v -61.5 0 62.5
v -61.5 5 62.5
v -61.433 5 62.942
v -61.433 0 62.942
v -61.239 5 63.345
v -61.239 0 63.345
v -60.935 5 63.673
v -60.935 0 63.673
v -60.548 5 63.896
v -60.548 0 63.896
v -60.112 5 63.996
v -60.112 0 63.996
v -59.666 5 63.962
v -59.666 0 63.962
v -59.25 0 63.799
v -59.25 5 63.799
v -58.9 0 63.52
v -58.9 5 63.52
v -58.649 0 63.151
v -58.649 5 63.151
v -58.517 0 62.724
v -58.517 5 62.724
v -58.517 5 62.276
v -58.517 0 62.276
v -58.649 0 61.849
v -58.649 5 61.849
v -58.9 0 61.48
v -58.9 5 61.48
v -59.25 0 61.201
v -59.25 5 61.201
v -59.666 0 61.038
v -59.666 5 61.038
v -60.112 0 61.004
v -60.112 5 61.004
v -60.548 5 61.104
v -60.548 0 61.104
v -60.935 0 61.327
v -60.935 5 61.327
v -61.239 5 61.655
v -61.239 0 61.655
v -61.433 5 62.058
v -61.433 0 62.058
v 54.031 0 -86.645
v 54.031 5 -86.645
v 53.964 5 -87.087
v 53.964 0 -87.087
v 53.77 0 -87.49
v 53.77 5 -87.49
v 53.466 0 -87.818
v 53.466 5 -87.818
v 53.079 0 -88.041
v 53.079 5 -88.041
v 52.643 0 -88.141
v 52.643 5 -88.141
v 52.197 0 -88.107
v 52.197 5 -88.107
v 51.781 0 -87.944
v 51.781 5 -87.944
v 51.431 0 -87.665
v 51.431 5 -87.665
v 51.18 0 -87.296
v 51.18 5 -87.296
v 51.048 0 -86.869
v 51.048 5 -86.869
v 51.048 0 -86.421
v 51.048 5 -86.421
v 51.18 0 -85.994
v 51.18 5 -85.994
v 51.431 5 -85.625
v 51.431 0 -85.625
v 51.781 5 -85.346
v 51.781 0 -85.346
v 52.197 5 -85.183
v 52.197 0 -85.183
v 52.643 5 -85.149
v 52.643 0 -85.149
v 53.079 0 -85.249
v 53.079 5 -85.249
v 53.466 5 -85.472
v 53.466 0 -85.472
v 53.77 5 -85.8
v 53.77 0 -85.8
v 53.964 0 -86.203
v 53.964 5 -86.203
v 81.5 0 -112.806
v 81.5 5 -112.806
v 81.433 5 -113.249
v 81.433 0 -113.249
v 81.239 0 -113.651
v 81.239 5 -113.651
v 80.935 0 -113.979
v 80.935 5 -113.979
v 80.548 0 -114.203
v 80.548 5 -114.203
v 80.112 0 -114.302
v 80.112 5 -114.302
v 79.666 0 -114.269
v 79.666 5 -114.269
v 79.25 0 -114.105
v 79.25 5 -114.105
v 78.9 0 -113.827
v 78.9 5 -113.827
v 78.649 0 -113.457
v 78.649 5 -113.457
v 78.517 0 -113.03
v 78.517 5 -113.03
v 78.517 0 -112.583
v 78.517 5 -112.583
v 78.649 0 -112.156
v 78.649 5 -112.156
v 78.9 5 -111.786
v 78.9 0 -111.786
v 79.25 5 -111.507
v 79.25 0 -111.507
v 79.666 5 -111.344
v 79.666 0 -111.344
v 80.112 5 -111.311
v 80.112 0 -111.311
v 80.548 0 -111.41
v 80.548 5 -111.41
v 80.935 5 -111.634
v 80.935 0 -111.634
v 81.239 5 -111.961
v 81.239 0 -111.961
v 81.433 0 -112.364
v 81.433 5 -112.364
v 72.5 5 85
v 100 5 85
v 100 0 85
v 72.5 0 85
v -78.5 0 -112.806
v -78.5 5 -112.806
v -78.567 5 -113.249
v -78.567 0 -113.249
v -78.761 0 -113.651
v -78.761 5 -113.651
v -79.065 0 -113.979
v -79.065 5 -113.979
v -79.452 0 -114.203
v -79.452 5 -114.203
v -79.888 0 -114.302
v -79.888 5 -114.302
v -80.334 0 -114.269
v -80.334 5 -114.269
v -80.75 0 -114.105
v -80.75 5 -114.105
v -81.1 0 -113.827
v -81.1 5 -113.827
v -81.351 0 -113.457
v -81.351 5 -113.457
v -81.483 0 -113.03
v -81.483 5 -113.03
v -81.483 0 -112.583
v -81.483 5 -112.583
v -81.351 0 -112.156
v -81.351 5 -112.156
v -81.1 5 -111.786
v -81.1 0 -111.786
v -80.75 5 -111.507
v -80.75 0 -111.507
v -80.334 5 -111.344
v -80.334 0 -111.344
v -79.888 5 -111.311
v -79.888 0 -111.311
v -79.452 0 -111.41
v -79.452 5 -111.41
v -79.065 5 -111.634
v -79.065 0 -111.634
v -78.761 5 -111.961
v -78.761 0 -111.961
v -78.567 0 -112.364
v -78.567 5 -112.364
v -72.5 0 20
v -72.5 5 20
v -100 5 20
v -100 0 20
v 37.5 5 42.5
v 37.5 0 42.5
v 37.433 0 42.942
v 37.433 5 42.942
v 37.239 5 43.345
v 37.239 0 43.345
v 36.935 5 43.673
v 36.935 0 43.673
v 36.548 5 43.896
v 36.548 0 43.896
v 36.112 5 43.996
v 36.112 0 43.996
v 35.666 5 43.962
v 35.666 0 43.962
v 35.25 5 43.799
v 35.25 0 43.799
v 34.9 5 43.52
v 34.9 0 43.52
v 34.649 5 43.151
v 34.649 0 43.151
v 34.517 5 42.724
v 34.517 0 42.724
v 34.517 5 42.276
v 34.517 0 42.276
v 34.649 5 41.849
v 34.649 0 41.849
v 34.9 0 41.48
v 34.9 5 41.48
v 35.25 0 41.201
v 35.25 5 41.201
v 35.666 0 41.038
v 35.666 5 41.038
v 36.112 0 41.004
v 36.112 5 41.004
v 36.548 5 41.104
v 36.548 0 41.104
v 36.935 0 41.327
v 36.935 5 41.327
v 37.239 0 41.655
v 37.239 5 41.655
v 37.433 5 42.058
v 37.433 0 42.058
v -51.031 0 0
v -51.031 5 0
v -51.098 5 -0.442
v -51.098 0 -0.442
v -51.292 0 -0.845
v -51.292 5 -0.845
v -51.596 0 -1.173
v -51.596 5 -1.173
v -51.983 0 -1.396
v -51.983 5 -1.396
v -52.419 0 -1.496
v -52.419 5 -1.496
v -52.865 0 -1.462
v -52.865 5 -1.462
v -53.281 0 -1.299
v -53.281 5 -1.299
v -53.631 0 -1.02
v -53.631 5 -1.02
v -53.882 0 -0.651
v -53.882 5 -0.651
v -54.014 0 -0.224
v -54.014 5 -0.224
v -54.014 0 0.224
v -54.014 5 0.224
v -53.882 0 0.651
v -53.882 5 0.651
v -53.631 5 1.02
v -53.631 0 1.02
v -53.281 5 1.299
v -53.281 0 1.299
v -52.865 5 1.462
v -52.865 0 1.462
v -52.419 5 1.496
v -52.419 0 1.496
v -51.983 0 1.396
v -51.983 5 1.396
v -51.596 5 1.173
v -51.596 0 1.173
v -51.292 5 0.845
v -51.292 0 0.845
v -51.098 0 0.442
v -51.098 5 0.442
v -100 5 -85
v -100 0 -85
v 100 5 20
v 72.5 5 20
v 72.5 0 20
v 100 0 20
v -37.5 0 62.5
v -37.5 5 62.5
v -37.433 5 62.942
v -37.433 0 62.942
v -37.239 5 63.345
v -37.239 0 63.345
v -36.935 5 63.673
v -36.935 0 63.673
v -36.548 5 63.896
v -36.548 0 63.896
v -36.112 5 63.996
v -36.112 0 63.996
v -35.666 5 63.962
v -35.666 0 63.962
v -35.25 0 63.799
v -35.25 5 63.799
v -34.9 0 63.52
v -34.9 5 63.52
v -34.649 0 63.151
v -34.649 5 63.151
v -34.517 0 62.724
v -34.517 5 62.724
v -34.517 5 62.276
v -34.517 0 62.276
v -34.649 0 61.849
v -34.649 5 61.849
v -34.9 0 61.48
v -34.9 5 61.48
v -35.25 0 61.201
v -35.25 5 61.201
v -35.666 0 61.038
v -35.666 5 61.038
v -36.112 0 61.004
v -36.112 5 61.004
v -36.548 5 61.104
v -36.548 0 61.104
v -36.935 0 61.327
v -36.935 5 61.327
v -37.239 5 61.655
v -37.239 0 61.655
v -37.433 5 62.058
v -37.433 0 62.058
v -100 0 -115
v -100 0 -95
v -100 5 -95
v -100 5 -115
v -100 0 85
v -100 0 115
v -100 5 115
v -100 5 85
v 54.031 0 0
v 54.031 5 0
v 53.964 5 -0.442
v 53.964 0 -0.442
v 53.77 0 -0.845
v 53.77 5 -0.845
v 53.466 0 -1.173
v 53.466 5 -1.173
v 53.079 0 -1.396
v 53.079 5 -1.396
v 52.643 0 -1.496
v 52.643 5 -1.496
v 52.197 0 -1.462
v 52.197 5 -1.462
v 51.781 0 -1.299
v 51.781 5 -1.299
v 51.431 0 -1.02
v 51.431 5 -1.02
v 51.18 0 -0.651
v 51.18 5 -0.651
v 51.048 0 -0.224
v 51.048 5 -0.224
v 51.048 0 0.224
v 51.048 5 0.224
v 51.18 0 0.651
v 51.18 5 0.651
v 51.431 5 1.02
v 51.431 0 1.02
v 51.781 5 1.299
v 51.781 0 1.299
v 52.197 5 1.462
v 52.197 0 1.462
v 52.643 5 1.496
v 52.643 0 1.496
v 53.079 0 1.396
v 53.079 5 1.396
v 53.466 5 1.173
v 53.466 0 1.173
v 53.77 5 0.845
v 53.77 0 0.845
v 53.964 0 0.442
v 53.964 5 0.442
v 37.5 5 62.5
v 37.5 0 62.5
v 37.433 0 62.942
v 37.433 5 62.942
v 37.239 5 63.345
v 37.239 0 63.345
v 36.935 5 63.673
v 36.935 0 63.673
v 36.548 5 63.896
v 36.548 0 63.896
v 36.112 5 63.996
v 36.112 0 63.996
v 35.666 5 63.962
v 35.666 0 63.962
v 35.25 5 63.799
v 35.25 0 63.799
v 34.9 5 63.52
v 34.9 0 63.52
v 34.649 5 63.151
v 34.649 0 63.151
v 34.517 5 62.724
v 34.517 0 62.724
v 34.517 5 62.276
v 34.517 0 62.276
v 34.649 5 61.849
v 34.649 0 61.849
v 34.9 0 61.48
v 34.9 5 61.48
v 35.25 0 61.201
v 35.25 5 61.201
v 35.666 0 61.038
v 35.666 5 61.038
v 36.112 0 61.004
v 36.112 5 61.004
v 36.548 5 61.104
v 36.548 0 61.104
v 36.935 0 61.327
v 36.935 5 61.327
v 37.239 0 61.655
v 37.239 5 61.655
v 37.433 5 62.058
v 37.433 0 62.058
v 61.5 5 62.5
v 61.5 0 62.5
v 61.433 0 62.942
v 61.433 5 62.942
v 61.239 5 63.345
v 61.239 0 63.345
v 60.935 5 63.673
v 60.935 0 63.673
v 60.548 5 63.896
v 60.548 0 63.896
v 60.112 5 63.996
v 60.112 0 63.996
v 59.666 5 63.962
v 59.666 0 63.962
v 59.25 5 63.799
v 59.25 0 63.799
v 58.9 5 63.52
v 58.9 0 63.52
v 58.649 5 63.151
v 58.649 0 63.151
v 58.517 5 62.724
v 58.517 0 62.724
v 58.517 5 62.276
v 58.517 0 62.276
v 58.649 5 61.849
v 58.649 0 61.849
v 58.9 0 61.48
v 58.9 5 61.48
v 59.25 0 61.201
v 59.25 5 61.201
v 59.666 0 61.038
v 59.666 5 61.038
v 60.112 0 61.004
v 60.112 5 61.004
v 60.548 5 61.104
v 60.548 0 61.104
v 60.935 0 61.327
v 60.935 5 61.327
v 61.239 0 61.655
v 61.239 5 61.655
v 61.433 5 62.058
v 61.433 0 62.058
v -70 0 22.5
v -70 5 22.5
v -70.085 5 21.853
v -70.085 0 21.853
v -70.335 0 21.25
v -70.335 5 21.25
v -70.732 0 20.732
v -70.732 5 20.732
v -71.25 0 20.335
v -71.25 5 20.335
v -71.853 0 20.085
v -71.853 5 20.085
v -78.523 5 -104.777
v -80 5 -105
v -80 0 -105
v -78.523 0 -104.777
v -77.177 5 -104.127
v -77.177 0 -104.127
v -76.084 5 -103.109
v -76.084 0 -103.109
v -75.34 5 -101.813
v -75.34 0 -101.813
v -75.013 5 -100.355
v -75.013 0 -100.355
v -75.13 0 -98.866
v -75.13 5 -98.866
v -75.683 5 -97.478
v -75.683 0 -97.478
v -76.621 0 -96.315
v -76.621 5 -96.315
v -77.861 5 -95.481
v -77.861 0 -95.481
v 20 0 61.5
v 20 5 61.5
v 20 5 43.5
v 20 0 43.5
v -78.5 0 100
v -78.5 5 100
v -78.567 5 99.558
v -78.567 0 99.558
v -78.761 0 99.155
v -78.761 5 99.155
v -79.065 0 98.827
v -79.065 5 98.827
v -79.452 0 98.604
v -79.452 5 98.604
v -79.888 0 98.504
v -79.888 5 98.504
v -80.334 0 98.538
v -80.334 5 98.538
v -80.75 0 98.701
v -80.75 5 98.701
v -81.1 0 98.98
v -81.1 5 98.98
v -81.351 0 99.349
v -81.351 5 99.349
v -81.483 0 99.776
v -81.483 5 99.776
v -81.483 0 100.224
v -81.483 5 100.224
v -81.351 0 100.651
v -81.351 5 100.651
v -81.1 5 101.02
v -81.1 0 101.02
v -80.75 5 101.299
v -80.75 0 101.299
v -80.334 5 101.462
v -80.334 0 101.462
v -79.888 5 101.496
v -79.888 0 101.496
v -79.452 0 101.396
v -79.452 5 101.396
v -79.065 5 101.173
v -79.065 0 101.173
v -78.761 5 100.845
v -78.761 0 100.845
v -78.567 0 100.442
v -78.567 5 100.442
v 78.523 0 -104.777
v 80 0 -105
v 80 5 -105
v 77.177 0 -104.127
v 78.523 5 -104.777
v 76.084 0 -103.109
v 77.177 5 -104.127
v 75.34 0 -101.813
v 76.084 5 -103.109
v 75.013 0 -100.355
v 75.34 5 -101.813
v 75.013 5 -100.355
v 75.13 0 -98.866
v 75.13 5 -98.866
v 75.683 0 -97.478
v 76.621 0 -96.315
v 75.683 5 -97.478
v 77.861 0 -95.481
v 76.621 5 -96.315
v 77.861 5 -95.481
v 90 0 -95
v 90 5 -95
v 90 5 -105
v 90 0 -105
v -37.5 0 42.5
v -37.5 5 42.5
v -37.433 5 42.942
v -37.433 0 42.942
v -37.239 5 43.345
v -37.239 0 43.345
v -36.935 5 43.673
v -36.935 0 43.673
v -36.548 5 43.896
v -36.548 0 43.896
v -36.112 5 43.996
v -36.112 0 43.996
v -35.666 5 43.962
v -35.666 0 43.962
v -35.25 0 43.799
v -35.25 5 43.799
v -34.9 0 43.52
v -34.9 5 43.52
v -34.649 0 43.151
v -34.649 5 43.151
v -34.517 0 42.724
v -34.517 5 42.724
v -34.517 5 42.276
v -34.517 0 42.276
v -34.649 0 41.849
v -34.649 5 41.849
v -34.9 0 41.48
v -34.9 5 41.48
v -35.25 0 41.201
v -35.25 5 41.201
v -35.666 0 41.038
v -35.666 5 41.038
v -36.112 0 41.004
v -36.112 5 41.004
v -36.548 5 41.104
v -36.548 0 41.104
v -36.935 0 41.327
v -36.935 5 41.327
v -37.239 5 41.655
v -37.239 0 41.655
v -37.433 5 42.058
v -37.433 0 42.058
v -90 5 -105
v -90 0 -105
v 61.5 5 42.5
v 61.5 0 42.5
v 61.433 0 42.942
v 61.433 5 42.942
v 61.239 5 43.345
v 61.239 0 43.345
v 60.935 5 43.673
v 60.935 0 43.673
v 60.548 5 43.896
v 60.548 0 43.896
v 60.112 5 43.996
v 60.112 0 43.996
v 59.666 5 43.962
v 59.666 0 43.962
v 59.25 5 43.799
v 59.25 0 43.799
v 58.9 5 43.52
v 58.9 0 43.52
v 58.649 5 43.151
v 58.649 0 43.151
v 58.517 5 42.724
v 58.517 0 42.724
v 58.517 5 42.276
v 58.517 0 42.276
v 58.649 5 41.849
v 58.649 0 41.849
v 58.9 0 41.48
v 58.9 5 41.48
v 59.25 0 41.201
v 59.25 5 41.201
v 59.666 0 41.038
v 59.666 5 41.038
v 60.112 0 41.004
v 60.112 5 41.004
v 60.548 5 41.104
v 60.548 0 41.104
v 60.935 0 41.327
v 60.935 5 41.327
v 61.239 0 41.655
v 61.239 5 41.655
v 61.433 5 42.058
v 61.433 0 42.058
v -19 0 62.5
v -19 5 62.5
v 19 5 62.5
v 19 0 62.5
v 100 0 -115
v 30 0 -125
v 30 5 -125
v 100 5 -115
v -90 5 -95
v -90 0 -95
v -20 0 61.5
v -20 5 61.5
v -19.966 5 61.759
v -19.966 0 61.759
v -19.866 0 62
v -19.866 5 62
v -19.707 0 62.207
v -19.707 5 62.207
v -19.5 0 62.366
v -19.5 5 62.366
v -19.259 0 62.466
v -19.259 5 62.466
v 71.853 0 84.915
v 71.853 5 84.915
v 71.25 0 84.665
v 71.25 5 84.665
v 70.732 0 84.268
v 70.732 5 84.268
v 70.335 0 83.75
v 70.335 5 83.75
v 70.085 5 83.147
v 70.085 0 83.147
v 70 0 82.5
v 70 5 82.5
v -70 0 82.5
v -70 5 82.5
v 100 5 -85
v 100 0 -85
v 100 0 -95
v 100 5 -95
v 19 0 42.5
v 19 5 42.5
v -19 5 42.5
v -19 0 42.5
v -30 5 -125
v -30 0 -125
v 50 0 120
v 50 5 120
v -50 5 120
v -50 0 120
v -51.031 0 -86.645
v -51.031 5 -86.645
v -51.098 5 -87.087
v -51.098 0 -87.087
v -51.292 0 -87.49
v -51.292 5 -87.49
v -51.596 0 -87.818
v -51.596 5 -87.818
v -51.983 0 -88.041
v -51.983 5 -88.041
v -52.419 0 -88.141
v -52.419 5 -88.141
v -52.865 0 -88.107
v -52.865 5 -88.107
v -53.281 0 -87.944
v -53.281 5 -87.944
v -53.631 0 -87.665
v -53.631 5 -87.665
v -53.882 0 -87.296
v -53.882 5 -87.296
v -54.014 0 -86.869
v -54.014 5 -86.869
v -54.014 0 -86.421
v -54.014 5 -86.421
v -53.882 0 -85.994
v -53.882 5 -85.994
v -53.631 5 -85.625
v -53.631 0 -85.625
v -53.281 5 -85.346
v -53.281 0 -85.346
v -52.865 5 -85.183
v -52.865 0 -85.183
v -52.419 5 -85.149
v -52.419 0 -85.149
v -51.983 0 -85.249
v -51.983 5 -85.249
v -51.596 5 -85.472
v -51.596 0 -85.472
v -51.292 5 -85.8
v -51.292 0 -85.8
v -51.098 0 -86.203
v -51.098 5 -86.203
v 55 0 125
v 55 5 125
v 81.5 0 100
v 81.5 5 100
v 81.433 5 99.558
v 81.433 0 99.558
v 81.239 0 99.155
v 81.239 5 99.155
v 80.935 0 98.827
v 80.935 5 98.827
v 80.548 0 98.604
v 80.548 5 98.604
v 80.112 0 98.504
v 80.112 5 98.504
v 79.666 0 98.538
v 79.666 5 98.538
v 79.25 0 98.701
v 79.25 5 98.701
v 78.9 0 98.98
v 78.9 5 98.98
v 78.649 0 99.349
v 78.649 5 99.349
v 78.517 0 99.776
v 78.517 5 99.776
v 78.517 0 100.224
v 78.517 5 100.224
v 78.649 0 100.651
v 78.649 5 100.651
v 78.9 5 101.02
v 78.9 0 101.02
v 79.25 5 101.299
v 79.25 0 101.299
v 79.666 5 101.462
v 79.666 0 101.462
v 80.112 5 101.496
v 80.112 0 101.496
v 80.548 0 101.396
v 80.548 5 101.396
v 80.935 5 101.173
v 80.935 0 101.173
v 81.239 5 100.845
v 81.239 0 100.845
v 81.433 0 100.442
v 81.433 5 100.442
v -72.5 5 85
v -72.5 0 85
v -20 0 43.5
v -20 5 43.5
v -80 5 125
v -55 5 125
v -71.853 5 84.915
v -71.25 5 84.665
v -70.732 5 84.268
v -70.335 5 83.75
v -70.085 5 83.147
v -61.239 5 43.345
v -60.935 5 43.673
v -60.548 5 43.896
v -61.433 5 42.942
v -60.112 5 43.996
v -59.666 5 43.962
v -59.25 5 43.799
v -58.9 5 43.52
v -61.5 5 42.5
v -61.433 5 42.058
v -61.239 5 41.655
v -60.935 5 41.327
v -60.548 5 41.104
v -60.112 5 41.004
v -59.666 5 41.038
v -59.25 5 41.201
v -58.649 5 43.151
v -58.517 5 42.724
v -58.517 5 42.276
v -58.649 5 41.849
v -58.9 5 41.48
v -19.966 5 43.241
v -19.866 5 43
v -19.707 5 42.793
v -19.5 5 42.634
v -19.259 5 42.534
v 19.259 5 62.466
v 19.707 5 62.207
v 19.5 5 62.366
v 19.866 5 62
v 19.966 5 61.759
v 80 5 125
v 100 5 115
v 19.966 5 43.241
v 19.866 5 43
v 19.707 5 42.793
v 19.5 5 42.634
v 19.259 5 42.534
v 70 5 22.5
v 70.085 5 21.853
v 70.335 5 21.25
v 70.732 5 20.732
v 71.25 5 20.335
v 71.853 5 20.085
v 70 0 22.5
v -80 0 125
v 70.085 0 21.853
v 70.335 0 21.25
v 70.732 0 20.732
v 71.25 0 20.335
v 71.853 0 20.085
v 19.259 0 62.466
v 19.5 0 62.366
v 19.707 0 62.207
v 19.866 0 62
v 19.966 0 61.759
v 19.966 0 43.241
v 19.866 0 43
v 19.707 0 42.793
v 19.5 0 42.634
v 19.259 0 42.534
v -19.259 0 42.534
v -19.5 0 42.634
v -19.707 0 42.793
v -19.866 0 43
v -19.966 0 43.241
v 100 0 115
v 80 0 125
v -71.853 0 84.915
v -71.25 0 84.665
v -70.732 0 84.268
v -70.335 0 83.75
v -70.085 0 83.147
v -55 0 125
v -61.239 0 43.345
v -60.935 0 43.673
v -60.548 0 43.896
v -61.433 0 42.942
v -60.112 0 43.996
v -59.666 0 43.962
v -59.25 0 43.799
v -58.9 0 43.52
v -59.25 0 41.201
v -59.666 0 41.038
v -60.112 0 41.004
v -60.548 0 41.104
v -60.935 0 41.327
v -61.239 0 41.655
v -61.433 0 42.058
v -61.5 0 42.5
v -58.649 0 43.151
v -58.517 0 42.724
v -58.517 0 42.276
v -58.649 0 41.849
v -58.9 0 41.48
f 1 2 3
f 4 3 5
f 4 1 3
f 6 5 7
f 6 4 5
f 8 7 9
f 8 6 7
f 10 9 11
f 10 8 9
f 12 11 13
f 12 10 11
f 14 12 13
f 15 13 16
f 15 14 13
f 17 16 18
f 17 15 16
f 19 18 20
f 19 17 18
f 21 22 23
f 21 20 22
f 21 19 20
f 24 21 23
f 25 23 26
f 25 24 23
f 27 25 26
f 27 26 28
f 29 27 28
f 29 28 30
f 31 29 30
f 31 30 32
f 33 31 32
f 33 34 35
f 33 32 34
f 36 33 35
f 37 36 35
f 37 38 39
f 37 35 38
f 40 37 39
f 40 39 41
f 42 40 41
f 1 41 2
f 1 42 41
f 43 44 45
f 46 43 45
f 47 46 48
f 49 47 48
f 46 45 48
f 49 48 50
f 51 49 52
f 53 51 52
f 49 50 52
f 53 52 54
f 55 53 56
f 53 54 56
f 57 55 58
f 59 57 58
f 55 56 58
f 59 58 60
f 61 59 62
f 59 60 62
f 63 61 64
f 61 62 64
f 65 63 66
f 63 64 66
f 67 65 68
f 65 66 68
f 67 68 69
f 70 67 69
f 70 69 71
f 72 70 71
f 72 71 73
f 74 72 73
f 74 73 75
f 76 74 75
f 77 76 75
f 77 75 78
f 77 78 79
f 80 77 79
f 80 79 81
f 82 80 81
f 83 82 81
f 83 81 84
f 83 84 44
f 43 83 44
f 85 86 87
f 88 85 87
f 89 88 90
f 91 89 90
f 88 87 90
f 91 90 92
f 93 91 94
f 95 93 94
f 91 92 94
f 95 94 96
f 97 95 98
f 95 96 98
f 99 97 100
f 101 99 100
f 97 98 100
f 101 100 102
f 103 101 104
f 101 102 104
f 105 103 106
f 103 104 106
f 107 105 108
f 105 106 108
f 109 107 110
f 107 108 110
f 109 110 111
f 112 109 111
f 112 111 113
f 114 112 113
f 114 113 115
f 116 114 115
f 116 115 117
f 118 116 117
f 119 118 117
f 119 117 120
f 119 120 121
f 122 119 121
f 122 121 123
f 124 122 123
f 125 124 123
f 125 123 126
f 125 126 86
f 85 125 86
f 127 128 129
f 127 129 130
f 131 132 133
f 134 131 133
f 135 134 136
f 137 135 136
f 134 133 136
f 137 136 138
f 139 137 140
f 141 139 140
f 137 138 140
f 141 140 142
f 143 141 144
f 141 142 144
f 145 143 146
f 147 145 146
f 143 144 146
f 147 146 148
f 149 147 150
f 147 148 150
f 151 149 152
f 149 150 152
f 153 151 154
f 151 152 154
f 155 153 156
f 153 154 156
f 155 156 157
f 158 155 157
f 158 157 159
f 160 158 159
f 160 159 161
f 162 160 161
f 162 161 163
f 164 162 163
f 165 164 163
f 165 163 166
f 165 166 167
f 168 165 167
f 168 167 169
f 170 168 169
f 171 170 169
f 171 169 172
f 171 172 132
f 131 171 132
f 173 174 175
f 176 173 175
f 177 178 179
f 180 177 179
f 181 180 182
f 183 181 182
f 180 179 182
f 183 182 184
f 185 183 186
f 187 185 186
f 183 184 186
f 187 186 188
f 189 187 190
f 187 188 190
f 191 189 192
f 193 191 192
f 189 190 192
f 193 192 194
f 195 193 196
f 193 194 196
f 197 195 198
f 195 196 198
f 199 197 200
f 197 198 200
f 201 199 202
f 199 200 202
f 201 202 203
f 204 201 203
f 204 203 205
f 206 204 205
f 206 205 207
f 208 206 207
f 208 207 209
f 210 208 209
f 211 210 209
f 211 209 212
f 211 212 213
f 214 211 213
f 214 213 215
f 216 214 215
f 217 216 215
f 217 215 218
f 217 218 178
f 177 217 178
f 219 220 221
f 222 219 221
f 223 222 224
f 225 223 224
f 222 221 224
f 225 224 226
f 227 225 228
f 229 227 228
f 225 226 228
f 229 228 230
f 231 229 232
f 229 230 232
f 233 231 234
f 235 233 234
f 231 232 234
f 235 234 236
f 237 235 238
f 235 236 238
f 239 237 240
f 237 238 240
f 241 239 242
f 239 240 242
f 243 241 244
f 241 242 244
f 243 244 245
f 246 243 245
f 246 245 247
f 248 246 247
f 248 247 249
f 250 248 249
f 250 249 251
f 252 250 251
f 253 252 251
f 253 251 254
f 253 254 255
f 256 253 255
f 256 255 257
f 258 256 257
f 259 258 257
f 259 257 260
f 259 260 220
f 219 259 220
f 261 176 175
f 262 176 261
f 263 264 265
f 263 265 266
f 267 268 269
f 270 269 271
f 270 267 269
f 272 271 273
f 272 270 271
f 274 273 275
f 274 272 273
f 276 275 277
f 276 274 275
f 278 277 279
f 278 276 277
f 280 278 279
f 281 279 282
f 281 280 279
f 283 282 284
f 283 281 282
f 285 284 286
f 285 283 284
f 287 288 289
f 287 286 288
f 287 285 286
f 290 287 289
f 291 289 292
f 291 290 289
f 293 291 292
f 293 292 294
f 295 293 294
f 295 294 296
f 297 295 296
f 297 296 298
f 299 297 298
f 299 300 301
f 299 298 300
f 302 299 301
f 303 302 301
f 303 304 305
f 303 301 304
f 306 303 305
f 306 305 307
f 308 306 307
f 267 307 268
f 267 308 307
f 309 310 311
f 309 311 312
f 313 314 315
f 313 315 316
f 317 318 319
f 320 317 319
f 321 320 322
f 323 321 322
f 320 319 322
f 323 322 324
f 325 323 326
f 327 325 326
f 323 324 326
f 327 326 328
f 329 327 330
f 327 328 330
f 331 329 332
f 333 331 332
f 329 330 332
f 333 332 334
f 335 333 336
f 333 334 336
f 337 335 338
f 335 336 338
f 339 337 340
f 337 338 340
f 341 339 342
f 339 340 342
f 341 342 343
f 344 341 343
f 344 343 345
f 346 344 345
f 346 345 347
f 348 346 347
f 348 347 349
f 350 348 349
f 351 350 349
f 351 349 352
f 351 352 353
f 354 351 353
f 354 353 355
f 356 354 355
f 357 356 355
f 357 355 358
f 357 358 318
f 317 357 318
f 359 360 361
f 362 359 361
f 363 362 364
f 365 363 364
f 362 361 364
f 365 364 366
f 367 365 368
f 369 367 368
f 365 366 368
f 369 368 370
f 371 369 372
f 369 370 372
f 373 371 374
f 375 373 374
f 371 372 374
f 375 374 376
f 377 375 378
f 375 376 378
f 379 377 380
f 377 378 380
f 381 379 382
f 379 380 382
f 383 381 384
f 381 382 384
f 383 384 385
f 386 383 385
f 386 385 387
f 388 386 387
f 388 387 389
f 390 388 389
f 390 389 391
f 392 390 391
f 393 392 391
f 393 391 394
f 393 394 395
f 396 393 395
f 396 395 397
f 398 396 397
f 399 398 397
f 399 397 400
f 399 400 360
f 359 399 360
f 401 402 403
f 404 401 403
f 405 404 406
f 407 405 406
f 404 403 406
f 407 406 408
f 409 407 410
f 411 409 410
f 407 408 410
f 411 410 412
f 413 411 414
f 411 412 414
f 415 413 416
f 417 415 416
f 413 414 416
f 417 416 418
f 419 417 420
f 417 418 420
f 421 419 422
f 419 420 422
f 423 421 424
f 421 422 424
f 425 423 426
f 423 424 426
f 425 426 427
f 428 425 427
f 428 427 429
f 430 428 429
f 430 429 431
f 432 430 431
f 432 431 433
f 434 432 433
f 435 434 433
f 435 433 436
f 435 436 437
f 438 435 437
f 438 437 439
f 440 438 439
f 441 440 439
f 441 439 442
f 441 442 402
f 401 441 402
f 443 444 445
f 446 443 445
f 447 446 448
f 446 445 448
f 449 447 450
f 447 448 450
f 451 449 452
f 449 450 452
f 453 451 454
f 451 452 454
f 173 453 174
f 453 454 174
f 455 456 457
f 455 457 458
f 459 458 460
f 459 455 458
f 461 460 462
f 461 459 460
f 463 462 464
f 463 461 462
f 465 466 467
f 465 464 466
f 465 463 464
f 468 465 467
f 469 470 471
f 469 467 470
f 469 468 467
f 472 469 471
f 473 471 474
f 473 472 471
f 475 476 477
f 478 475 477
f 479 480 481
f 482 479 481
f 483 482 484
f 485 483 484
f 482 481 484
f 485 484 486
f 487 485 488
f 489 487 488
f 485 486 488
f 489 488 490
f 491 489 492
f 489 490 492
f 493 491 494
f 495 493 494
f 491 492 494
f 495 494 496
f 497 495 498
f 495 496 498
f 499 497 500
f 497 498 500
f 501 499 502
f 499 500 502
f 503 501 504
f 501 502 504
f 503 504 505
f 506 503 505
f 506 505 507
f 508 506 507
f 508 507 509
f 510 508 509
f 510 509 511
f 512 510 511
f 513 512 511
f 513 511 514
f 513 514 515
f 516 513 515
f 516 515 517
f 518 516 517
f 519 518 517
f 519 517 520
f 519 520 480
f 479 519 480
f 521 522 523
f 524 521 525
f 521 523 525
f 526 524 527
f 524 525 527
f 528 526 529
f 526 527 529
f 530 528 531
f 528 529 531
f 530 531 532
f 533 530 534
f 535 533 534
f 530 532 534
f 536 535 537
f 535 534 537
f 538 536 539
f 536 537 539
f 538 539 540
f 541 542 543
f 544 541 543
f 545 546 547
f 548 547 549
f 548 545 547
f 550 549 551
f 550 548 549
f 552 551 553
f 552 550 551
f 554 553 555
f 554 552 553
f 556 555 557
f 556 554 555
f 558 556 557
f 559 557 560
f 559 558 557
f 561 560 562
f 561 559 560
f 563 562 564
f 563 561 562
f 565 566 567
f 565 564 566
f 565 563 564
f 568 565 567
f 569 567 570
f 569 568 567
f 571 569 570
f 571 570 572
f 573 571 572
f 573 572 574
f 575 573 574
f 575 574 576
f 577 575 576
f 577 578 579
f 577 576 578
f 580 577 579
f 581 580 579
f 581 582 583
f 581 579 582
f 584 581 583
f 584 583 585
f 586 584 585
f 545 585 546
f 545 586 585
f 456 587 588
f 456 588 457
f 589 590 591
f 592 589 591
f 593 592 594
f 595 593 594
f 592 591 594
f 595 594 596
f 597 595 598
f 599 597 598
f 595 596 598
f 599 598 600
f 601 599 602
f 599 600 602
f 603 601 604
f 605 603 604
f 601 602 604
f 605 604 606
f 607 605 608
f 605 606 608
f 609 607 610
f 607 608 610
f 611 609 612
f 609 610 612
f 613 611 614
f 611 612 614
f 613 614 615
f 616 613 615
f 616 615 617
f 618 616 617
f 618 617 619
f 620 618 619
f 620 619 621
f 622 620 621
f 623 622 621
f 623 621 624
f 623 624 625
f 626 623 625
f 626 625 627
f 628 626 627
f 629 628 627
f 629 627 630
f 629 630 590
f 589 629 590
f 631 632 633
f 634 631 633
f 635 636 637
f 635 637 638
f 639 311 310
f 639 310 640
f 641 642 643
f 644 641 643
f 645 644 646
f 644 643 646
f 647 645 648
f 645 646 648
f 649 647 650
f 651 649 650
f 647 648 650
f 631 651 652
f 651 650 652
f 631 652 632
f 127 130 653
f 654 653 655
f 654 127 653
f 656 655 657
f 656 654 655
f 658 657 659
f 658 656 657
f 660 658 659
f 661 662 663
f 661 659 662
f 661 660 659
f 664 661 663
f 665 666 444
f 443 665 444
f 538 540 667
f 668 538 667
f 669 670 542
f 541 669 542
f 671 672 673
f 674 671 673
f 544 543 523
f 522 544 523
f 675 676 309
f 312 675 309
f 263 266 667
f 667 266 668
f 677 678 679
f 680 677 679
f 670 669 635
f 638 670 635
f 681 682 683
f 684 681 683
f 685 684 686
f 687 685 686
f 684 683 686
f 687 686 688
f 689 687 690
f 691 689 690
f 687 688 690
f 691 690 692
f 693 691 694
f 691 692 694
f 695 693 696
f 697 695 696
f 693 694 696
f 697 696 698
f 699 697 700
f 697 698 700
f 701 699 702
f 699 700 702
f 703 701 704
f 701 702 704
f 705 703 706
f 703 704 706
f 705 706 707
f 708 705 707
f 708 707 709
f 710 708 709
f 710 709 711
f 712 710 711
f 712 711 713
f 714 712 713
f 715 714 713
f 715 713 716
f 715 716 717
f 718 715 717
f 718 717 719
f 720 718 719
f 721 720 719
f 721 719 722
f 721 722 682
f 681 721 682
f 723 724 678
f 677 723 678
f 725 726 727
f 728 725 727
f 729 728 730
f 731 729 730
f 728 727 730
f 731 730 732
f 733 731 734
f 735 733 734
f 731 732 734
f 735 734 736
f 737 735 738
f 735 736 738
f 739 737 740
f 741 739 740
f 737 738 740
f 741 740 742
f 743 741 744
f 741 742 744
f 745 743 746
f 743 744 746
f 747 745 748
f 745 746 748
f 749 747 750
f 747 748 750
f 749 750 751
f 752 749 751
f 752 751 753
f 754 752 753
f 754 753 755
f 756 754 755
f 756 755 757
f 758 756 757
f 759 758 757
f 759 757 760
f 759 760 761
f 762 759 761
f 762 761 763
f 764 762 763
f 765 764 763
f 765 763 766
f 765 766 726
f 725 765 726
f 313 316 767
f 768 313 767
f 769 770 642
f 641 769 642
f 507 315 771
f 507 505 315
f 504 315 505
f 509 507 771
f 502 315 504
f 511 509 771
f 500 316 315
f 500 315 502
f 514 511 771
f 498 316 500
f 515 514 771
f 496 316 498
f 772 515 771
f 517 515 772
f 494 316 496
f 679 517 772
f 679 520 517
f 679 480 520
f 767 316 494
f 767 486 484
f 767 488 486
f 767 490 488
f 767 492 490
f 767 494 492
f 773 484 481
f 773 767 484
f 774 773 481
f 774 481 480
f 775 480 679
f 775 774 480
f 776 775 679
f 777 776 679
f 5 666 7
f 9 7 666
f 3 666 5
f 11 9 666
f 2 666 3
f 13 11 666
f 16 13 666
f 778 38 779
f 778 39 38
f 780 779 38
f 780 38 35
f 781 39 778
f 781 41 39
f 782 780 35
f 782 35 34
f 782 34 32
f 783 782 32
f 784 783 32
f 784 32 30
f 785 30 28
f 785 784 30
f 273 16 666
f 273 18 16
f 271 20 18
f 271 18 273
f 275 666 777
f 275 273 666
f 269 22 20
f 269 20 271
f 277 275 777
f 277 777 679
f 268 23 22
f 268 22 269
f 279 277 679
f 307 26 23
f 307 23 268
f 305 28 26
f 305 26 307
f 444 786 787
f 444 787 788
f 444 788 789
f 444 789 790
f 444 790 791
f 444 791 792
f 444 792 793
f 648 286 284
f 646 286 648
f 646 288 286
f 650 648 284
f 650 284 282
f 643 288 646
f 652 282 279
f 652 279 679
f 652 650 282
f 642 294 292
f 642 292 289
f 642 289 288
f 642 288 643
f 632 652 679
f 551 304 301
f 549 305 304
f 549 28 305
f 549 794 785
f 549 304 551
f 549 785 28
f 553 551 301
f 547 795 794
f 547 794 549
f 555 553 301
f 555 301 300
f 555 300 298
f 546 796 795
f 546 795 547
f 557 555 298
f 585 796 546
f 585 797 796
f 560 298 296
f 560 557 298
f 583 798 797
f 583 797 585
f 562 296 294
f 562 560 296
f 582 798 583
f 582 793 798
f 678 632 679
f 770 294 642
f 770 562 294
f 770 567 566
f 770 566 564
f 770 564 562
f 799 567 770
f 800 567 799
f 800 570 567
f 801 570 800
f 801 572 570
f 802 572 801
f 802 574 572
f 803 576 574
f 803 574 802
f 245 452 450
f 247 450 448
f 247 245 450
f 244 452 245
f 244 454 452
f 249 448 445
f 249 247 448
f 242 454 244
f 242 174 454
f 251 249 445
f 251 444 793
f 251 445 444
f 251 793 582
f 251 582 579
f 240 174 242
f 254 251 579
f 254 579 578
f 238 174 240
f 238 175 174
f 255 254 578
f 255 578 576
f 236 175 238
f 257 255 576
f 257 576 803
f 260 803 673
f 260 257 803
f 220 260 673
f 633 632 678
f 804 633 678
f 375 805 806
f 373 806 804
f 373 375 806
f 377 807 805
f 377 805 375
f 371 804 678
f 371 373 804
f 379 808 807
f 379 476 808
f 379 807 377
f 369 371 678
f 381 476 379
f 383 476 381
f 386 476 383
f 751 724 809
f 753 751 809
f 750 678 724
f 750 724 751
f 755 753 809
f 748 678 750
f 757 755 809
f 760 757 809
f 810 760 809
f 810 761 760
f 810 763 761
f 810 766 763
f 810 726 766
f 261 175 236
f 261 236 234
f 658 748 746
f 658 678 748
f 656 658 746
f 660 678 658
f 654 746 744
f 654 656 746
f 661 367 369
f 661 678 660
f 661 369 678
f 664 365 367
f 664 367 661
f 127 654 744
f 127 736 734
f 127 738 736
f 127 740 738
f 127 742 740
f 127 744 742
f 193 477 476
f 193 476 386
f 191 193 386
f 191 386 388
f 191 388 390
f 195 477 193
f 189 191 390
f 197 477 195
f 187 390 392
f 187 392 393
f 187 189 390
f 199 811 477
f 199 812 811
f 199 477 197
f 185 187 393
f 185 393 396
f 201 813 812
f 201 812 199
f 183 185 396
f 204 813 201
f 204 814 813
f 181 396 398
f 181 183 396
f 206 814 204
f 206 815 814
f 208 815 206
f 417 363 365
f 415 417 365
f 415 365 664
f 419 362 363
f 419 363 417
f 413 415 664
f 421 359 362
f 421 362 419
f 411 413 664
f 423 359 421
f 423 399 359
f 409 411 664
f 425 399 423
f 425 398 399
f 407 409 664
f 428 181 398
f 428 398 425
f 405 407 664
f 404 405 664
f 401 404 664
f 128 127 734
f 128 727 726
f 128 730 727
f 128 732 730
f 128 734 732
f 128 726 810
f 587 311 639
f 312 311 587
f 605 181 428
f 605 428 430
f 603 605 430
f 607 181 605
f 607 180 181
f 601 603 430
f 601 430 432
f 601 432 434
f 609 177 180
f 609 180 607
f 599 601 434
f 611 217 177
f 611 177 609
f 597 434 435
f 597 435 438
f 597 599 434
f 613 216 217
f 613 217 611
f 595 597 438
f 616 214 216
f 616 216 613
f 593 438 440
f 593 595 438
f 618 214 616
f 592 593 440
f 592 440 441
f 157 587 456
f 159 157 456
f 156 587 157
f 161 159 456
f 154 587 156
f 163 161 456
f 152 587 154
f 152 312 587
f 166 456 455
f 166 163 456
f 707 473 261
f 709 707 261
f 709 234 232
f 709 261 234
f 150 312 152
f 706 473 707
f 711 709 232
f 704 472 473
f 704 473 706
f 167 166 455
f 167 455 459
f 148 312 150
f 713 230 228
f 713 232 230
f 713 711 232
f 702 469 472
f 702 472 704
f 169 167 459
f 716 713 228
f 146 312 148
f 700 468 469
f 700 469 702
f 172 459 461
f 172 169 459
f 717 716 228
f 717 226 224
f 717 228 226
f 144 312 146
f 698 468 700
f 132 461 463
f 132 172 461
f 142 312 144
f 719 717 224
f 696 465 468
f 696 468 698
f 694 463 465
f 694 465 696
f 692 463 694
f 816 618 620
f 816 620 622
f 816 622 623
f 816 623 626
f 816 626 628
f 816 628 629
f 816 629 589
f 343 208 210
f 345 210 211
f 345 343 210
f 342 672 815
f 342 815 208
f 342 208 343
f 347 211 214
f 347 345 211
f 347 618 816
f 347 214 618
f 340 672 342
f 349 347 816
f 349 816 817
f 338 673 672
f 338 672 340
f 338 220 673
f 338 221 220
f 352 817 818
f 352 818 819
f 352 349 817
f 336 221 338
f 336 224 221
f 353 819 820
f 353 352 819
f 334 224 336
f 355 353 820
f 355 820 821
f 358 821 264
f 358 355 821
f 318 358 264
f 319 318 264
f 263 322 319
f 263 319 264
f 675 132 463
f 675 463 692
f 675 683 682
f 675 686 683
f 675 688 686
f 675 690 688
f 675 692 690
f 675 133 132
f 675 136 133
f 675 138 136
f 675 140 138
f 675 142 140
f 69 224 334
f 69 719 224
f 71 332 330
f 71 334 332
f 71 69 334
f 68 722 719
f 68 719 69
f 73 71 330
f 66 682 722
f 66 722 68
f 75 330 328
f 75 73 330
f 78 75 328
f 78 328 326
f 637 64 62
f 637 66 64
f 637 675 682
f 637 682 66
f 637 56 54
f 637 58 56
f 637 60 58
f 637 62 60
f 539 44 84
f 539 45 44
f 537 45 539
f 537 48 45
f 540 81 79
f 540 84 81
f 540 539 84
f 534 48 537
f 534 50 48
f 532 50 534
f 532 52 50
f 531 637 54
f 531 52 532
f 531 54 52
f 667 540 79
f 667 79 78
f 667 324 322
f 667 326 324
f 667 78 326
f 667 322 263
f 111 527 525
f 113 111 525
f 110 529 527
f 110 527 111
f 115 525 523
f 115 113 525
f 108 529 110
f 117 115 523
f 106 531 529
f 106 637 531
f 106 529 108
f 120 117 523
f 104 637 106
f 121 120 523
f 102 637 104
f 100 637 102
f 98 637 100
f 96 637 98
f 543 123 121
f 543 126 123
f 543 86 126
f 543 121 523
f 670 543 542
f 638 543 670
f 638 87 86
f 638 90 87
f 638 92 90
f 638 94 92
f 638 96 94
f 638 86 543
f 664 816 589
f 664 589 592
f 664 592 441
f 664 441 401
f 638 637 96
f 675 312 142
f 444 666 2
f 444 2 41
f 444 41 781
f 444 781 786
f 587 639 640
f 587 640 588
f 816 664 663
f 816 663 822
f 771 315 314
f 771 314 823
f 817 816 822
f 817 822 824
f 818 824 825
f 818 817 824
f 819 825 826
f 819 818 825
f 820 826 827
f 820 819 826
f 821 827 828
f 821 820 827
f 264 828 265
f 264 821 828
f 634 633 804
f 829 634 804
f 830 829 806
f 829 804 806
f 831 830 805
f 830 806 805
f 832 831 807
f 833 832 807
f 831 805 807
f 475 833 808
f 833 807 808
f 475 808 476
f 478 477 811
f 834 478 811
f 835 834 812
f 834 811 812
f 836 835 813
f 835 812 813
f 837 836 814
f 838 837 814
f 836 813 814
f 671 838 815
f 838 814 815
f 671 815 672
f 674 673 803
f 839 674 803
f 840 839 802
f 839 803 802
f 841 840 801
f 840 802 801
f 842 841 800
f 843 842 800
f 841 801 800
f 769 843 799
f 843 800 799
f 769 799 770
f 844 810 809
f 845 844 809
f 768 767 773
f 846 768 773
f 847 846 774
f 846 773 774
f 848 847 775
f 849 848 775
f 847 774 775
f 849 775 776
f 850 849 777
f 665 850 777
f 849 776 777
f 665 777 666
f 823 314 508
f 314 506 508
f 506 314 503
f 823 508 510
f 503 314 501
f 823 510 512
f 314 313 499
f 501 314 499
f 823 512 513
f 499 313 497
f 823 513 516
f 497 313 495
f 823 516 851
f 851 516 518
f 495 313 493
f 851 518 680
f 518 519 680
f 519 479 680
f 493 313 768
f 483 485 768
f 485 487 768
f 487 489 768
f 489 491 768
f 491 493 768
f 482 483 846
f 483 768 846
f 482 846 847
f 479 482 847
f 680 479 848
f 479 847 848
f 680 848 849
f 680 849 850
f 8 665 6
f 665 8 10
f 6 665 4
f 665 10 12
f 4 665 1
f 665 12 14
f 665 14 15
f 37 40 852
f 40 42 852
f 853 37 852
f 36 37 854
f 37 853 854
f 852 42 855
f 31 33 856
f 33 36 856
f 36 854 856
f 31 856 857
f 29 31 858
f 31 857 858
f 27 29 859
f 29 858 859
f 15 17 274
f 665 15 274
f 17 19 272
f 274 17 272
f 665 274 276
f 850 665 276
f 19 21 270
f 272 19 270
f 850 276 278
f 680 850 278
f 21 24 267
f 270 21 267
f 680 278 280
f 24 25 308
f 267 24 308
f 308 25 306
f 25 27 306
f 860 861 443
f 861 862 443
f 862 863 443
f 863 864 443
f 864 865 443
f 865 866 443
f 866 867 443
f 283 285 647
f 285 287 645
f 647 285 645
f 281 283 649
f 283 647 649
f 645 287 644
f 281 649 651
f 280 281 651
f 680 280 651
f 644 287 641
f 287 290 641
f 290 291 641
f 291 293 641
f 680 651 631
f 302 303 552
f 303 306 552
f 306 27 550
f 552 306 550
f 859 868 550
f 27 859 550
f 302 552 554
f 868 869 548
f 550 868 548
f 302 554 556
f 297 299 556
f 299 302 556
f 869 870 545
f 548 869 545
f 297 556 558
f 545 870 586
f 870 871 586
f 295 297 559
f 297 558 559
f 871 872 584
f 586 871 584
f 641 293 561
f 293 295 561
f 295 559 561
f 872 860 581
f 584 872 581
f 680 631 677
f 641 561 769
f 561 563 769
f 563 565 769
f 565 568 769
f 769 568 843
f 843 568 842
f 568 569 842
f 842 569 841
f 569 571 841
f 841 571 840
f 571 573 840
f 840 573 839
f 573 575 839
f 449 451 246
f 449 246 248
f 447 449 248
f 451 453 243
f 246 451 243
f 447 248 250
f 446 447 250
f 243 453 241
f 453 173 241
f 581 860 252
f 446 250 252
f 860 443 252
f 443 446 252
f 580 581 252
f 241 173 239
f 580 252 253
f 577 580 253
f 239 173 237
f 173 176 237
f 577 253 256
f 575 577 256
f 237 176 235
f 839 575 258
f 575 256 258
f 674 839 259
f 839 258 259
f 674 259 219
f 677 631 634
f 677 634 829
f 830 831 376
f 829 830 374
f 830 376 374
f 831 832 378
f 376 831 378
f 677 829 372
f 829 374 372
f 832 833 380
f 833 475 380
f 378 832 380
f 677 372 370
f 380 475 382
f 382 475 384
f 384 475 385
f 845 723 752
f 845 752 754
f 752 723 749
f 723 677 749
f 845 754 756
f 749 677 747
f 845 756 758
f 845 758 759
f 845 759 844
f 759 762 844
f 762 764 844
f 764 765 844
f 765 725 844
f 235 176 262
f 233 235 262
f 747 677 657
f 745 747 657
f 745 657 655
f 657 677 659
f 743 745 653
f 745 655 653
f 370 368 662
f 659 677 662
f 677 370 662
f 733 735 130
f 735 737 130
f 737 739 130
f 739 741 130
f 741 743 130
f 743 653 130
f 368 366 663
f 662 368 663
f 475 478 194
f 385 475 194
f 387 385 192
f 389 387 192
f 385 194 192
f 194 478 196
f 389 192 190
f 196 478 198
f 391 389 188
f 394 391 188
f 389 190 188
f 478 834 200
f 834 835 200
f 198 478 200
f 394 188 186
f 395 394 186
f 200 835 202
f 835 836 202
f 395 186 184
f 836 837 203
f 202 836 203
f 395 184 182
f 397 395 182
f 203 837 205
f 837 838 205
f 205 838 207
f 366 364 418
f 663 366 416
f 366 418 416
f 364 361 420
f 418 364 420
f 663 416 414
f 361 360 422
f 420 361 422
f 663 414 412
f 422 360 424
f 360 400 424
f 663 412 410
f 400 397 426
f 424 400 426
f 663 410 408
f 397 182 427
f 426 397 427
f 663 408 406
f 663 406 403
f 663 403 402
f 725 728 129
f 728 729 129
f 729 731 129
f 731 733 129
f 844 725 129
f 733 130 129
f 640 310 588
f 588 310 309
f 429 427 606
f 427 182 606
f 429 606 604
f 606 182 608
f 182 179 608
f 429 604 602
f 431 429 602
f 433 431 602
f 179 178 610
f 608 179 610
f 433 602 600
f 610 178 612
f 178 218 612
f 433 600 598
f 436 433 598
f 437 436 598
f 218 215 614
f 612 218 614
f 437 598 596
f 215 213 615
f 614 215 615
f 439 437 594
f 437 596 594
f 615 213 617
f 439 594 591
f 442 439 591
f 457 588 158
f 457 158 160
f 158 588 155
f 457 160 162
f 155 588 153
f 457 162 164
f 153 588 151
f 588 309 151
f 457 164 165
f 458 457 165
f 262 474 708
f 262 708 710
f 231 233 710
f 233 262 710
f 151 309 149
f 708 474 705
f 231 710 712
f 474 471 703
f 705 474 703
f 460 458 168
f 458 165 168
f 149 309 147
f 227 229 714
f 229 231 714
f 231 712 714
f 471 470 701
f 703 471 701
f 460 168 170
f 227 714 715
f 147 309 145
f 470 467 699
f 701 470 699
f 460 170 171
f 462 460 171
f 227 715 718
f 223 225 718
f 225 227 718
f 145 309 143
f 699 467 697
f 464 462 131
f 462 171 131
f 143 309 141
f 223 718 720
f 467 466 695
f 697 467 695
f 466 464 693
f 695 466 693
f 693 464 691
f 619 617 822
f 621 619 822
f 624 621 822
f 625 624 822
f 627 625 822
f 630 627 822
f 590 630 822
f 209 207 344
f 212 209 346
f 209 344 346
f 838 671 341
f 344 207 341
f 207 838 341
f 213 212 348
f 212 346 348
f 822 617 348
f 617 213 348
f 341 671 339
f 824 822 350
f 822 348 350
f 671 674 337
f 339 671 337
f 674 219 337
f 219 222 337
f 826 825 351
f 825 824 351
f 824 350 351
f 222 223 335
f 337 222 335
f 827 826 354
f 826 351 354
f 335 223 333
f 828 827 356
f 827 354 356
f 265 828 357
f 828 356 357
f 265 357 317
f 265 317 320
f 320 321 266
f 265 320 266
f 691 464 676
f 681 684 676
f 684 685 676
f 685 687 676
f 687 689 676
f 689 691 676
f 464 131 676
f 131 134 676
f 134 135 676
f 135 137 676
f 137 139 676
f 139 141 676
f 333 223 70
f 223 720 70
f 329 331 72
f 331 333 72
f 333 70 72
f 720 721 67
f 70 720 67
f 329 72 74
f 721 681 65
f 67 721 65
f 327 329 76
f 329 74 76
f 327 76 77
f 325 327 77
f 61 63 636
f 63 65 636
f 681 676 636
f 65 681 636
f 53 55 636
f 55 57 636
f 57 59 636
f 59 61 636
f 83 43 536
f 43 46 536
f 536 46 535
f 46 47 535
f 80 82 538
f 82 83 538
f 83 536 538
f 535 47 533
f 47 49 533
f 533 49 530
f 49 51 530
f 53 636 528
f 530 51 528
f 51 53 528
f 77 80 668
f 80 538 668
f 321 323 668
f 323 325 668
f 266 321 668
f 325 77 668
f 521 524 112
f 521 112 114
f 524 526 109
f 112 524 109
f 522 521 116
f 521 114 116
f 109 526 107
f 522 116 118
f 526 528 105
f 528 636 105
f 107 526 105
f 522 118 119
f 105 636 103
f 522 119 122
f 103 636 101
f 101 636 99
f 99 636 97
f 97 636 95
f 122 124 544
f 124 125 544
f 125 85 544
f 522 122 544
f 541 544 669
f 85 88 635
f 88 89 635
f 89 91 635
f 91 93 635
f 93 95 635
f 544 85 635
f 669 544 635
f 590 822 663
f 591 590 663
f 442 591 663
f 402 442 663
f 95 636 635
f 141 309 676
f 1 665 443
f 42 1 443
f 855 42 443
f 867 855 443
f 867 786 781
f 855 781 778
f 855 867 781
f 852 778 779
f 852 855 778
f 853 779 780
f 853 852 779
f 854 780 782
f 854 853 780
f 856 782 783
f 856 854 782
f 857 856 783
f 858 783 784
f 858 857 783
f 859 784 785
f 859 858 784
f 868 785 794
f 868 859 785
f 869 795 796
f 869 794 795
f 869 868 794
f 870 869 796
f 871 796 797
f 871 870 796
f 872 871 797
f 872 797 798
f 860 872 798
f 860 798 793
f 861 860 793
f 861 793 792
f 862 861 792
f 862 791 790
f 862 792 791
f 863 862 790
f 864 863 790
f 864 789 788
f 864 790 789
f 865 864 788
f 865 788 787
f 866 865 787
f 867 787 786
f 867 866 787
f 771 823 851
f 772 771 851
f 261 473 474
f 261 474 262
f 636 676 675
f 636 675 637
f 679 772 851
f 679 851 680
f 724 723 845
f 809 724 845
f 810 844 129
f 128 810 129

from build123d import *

# Parameters (mm, degrees)
SKETCH_1_W           = 200
SKETCH_1_H           = 250
EXTRUDE_1_DEPTH      = 5
CUT_EXTRUDE_1_DEPTH  = 35
CUT_EXTRUDE_2_DEPTH  = 35
CUT_EXTRUDE_5_DEPTH  = 30
CUT_EXTRUDE_6_DEPTH  = 10
SKETCH_9_R           = 1.5
CUT_EXTRUDE_8_DEPTH  = 10
SKETCH_10_R          = 1.5
CUT_EXTRUDE_9_DEPTH  = 10
CUT_EXTRUDE_12_DEPTH = 10
SKETCH_15_R          = 1.5
CUT_EXTRUDE_13_DEPTH = 10
SKETCH_16_R          = 1.5
CUT_EXTRUDE_14_DEPTH = 10
CUT_EXTRUDE_15_DEPTH = 10


with BuildPart() as part:
    # 草图1 → 凸台-拉伸1 (new body)
    with BuildSketch(Plane(origin=(0, 0, 0), x_dir=(1, 0, 0), z_dir=(0, 1, 0))):
        Rectangle(SKETCH_1_W, SKETCH_1_H)
    extrude(amount=EXTRUDE_1_DEPTH)

    # 草图2 → 切除-拉伸1 (cut)
    with BuildSketch(Plane(origin=(0, 5, 0), x_dir=(1, 0, 0), z_dir=(0, 1, 0))):
        Polygon((-100, -115), (-80, -125), (-100, -125), align=None)
    cut_extrude_1 = extrude(amount=-CUT_EXTRUDE_1_DEPTH, mode=Mode.SUBTRACT)

    # 镜向1: 切除-拉伸1 across plane
    add(cut_extrude_1.mirror(Plane(origin=(0, 0, 0), x_dir=(0, 0, 1), z_dir=(1, 0, 0))), mode=Mode.SUBTRACT)

    # 草图3 → 切除-拉伸2 (cut)
    with BuildSketch(Plane(origin=(0, 5, 0), x_dir=(1, 0, 0), z_dir=(0, 1, 0))):
        Polygon((-55, -125), (-50, -120), (0, -120), (0, -125), align=None)
    cut_extrude_2 = extrude(amount=-CUT_EXTRUDE_2_DEPTH, mode=Mode.SUBTRACT)

    # 镜向2: 切除-拉伸2 across plane
    add(cut_extrude_2.mirror(Plane(origin=(0, 0, 0), x_dir=(0, 0, 1), z_dir=(1, 0, 0))), mode=Mode.SUBTRACT)

    # 草图5 → 切除-拉伸5 (cut)
    with BuildSketch(Plane(origin=(0, 0, 0), x_dir=(1, 0, 0), z_dir=(0, 1, 0))):
        Polygon((-30, 125), (-100, 115), (-100, 125), align=None)
    cut_extrude_5 = extrude(amount=CUT_EXTRUDE_5_DEPTH, mode=Mode.SUBTRACT)

    # 镜向3: 切除-拉伸5 across plane
    add(cut_extrude_5.mirror(Plane(origin=(0, 0, 0), x_dir=(0, 0, 1), z_dir=(1, 0, 0))), mode=Mode.SUBTRACT)

    # 草图6 → 切除-拉伸6 (cut)
    with BuildSketch(Plane(origin=(0, 5, 0), x_dir=(1, 0, 0), z_dir=(0, 1, 0))):
        with BuildLine():
            Line((-100, 95), (-90, 95))
            Line((-90, 95), (-90, 105))
            Line((-90, 105), (-80, 105))
            ThreePointArc((-80, 105), (-75.121684822, 101.096376317), (-77.860612309, 95.480816412))
            Line((-77.860612309, 95.480816412), (-100, 85))
            Line((-100, 85), (-100, 95))
        make_face()
    cut_extrude_6 = extrude(amount=-CUT_EXTRUDE_6_DEPTH, mode=Mode.SUBTRACT)

    # 镜向4: 切除-拉伸6 across plane
    add(cut_extrude_6.mirror(Plane(origin=(0, 0, 0), x_dir=(0, 0, 1), z_dir=(1, 0, 0))), mode=Mode.SUBTRACT)

    # 草图9 → 切除-拉伸8 (cut)
    with BuildSketch(Plane(origin=(0, 5, 0), x_dir=(1, 0, 0), z_dir=(0, 1, 0))):
        with Locations((-80, -100)):
            Circle(SKETCH_9_R)
        with Locations((80, -100)):
            Circle(SKETCH_9_R)
    extrude(amount=-CUT_EXTRUDE_8_DEPTH, mode=Mode.SUBTRACT)

    # 草图10 → 切除-拉伸9 (cut)
    with BuildSketch(Plane(origin=(0, 5, 0), x_dir=(1, 0, 0), z_dir=(0, 1, 0))):
        with Locations((-80, 112.806380134)):
            Circle(SKETCH_10_R)
        with Locations((80, 112.806380134)):
            Circle(SKETCH_10_R)
    extrude(amount=-CUT_EXTRUDE_9_DEPTH, mode=Mode.SUBTRACT)

    # 草图14 → 切除-拉伸12 (cut)
    with BuildSketch(Plane(origin=(0, 5, 0), x_dir=(1, 0, 0), z_dir=(0, 1, 0))):
        with BuildLine():
            Line((-100, -85), (-72.5, -85))
            ThreePointArc((-72.5, -85), (-70.732233047, -84.267766953), (-70, -82.5))
            Line((-70, -82.5), (-70, -22.5))
            ThreePointArc((-70, -22.5), (-70.732233047, -20.732233047), (-72.5, -20))
            Line((-72.5, -20), (-100, -20))
            Line((-100, -20), (-100, -85))
        make_face()
        with BuildLine():
            Line((100, -20), (100, -85))
            Line((100, -85), (72.5, -85))
            ThreePointArc((72.5, -85), (70.732233047, -84.267766953), (70, -82.5))
            Line((70, -82.5), (70, -22.5))
            ThreePointArc((70, -22.5), (70.732233047, -20.732233047), (72.5, -20))
            Line((72.5, -20), (100, -20))
        make_face()
    extrude(amount=-CUT_EXTRUDE_12_DEPTH, mode=Mode.SUBTRACT)

    # 草图15 → 切除-拉伸13 (cut)
    with BuildSketch(Plane(origin=(0, 5, 0), x_dir=(1, 0, 0), z_dir=(0, 1, 0))):
        with Locations((-52.53096351, 0)):
            Circle(SKETCH_15_R)
        with Locations((-52.53096351, 86.645023586)):
            Circle(SKETCH_15_R)
        with Locations((52.53096351, 0)):
            Circle(SKETCH_15_R)
        with Locations((52.53096351, 86.645023586)):
            Circle(SKETCH_15_R)
    extrude(amount=-CUT_EXTRUDE_13_DEPTH, mode=Mode.SUBTRACT)

    # 草图16 → 切除-拉伸14 (cut)
    with BuildSketch(Plane.XZ):
        with Locations((60, 62.5)):
            Circle(SKETCH_16_R)
        with Locations((60, 42.5)):
            Circle(SKETCH_16_R)
        with Locations((36, 42.5)):
            Circle(SKETCH_16_R)
        with Locations((36, 62.5)):
            Circle(SKETCH_16_R)
    cut_extrude_14 = extrude(amount=-CUT_EXTRUDE_14_DEPTH, mode=Mode.SUBTRACT)

    # 镜向5: 切除-拉伸14 across plane
    add(cut_extrude_14.mirror(Plane(origin=(0, 0, 0), x_dir=(0, 0, 1), z_dir=(1, 0, 0))), mode=Mode.SUBTRACT)

    # 草图18 → 切除-拉伸15 (cut)
    with BuildSketch(Plane(origin=(0, 5, 0), x_dir=(1, 0, 0), z_dir=(0, 1, 0))):
        with BuildLine():
            Line((-19, -62.5), (19, -62.5))
            ThreePointArc((19, -62.5), (19.707106781, -62.207106781), (20, -61.5))
            Line((20, -61.5), (20, -43.5))
            ThreePointArc((20, -43.5), (19.707106781, -42.792893219), (19, -42.5))
            Line((19, -42.5), (-19, -42.5))
            ThreePointArc((-19, -42.5), (-19.707106781, -42.792893219), (-20, -43.5))
            Line((-20, -43.5), (-20, -61.5))
            ThreePointArc((-20, -61.5), (-19.707106781, -62.207106781), (-19, -62.5))
        make_face()
    extrude(amount=-CUT_EXTRUDE_15_DEPTH, mode=Mode.SUBTRACT)


solid = part.part
